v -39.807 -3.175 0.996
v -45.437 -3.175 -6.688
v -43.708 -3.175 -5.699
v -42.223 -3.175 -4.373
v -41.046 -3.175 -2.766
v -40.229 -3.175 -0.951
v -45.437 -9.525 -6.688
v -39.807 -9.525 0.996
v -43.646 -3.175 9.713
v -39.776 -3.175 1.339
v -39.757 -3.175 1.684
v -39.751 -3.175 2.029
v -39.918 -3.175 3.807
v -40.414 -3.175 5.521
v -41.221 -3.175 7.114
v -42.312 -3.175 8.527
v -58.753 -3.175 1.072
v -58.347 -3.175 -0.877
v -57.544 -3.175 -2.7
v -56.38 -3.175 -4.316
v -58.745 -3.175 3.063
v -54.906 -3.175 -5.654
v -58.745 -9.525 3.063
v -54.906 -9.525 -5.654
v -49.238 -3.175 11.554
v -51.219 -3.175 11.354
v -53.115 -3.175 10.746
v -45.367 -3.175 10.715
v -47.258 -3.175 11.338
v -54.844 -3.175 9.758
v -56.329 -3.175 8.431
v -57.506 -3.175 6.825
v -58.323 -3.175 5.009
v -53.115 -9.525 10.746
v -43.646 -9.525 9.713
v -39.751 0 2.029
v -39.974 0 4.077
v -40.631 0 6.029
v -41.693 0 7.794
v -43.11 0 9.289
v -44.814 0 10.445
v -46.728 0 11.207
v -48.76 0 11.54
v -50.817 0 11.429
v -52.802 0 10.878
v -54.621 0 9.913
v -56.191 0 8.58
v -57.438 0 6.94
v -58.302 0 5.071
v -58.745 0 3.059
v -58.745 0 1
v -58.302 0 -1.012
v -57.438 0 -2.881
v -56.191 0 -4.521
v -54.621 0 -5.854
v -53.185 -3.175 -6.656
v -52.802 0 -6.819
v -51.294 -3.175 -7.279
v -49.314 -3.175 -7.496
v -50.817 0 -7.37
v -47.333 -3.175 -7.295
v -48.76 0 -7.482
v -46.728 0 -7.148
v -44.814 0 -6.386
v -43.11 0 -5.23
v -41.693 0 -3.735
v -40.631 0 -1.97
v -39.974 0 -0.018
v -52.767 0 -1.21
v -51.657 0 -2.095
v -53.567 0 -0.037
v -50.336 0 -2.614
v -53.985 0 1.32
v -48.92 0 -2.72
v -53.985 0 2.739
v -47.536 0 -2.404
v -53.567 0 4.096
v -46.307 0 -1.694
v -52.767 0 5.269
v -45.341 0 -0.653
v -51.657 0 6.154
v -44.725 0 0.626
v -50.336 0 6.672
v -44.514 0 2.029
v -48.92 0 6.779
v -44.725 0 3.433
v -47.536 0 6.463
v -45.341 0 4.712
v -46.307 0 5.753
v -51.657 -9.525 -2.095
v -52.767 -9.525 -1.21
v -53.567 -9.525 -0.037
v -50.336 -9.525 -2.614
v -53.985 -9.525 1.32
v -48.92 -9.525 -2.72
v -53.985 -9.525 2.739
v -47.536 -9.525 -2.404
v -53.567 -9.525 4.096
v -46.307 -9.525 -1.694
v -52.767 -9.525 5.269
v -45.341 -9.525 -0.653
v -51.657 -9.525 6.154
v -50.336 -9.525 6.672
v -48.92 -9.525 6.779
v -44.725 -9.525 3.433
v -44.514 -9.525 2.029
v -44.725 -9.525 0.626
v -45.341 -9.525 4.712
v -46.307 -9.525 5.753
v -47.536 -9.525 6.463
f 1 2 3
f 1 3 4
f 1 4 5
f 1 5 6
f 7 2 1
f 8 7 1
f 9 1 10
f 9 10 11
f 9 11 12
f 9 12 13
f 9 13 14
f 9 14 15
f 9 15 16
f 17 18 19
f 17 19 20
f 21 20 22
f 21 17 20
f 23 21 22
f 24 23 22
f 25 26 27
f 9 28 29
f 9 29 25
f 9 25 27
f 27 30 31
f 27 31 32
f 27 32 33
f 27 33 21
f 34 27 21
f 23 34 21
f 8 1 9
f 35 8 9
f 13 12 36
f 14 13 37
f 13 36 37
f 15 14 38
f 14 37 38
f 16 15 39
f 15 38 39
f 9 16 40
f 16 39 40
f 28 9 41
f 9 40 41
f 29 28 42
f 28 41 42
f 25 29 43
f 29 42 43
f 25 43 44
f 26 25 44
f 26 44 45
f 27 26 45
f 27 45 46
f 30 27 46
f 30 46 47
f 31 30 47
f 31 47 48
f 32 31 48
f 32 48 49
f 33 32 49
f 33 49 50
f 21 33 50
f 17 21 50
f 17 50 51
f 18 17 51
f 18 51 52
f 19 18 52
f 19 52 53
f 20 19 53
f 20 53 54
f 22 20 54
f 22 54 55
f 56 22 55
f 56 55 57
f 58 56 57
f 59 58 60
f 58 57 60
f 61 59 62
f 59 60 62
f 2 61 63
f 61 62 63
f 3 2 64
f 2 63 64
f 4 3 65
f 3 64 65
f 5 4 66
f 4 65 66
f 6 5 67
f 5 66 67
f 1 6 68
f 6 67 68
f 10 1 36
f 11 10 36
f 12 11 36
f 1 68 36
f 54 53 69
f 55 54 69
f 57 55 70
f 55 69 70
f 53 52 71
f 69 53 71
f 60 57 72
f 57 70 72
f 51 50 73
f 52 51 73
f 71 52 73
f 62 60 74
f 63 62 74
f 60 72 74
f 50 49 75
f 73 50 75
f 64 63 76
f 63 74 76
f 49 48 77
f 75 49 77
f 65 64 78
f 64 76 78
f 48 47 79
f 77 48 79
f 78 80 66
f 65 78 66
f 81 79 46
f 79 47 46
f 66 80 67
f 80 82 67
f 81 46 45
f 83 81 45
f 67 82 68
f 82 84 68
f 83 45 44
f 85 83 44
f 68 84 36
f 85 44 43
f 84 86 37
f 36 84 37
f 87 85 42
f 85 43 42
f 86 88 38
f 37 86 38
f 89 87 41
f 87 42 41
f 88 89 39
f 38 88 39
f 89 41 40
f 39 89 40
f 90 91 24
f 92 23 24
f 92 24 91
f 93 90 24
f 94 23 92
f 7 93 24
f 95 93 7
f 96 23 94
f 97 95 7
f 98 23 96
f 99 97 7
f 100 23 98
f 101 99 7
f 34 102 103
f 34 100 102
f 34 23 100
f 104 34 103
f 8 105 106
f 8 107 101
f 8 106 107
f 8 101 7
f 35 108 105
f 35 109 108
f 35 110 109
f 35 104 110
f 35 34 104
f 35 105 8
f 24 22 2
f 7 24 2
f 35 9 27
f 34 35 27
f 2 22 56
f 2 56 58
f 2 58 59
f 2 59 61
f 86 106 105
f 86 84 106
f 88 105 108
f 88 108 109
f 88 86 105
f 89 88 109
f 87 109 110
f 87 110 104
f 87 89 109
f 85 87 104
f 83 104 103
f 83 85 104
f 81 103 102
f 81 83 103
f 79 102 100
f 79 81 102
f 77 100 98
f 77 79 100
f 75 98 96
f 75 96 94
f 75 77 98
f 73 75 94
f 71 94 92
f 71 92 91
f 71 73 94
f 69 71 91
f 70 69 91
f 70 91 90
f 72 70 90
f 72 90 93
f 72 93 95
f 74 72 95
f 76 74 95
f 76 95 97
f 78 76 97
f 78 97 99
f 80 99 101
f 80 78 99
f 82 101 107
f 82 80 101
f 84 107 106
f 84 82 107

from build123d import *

# Parameters (mm, degrees)
F0_R     = 9.525
F0_R_2   = 4.7625
F1_DEPTH = 3.175
F2_R     = 4.7625
F3_DEPTH = 6.35


# Not quite as in the source:
# - a feature names something its author has since deleted; it is built from what else it names


with BuildPart() as f1:
    # F0 (on Front) → F1 (new body)
    with BuildSketch(Plane.XZ):
        with Locations((-49.2760017514, 2.0293546841)):
            Circle(F0_R)
        with Locations((-49.2760017514, 2.0293546841)):
            Circle(F0_R_2, mode=Mode.SUBTRACT)
    extrude(amount=F1_DEPTH)

    # F2 (on face) → F3 (join)
    with BuildSketch(Plane.XZ.offset(3.175)):
        Polygon((-39.8072749816, 0.9955082934), (-43.6463011287, 9.7125894129), (-53.1150278984, 10.7464358035), (-58.7447285212, 3.0632010747), (-54.9057023742, -5.6538800448), (-45.4369756044, -6.6877264354), align=None)
        with Locations((-49.2760017514, 2.0293546841)):
            Circle(F2_R, mode=Mode.SUBTRACT)
    extrude(amount=F3_DEPTH)


solid = f1.part
